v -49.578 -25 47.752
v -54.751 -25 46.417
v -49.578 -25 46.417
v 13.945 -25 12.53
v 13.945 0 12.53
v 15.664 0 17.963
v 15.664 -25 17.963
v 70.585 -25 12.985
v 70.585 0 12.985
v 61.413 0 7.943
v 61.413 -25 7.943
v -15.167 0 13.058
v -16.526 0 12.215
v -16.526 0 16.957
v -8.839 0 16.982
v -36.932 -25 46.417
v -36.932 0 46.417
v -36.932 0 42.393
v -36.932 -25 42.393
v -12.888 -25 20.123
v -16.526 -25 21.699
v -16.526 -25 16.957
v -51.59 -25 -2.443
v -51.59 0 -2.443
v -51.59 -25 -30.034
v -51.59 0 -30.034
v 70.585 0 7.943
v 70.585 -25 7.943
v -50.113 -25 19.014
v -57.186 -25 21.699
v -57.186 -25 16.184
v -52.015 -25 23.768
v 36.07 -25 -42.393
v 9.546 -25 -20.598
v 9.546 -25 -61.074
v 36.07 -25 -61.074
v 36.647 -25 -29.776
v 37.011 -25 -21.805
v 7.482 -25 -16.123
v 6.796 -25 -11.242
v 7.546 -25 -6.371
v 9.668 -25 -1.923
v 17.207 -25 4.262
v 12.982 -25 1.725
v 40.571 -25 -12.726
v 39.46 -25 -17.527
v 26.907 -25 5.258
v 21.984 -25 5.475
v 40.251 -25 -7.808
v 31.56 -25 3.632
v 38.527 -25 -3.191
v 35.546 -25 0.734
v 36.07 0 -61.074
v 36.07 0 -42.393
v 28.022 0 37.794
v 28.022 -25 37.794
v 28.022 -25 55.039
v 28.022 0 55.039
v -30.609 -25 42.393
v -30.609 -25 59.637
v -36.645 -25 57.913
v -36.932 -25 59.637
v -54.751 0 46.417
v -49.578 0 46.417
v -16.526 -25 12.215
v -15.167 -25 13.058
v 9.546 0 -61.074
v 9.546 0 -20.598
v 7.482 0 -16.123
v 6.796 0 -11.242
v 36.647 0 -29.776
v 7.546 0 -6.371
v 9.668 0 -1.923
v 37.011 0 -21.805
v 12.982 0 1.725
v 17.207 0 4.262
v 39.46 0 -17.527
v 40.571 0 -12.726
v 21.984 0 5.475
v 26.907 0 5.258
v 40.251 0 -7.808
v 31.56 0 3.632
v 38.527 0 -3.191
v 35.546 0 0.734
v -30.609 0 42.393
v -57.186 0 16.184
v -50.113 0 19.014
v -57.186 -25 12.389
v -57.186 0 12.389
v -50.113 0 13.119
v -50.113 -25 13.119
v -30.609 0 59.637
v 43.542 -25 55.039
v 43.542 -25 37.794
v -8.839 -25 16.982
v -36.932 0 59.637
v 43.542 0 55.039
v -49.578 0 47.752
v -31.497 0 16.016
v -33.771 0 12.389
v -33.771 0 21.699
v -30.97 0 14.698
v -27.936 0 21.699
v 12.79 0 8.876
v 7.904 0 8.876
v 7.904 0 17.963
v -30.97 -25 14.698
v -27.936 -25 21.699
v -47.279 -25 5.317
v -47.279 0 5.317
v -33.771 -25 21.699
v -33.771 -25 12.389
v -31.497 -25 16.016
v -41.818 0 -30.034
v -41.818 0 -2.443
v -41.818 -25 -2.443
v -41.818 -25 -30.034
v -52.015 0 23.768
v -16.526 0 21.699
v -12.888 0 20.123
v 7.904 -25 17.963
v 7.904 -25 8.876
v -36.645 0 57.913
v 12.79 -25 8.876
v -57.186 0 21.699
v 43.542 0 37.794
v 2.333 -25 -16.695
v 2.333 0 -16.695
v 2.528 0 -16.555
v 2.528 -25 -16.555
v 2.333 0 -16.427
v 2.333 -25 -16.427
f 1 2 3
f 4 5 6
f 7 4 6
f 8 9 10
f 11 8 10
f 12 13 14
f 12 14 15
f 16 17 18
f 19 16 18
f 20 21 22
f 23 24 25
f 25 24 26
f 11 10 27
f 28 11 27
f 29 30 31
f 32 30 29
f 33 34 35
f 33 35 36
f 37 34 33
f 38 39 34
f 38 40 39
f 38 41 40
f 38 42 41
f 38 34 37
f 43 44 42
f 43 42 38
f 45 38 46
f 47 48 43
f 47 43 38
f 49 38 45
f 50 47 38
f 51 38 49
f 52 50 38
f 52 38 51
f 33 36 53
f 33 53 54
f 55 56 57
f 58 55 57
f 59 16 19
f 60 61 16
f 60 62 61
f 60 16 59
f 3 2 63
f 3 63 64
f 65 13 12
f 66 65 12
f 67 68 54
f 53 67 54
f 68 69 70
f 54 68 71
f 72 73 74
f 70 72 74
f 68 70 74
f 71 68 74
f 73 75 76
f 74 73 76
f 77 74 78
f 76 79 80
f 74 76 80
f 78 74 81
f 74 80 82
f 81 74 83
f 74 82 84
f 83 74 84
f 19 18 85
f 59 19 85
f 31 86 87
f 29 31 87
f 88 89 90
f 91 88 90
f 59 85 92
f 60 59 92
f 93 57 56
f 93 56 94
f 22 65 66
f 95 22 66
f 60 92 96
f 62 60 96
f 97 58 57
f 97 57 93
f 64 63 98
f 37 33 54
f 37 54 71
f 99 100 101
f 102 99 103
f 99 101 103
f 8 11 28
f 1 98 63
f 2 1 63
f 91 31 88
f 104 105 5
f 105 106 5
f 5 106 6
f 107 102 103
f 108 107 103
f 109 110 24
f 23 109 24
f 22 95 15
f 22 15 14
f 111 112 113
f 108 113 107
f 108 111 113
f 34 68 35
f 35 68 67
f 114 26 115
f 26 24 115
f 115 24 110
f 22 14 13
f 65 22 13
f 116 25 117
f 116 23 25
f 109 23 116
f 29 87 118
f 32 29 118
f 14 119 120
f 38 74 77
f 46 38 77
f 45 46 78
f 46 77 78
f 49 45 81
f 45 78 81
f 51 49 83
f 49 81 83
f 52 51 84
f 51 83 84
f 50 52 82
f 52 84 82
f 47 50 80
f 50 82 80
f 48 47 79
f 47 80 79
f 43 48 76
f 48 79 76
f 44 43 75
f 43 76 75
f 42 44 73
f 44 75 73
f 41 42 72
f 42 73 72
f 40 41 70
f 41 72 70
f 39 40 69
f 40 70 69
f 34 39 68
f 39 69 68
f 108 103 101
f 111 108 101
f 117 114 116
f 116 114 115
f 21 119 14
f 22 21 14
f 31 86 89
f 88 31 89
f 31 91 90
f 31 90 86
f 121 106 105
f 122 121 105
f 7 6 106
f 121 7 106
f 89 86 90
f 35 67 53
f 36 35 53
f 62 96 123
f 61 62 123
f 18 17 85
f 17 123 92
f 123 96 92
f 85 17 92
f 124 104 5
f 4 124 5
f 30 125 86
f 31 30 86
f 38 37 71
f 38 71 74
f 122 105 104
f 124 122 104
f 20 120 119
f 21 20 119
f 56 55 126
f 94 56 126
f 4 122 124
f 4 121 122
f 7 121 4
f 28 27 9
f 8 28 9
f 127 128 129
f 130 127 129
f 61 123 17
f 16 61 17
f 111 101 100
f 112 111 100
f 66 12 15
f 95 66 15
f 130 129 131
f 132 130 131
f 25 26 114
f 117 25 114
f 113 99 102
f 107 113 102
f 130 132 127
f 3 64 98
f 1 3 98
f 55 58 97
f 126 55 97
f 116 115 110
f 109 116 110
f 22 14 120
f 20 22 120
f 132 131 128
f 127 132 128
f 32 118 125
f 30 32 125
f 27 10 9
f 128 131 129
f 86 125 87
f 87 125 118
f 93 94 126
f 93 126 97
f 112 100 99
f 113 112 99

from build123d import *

# Parameters (mm, degrees)
F1_DEPTH = 25
F2_W     = 15.520076
F2_H     = 17.244525
F3_DEPTH = 25
F4_R     = 16.91566
F5_DEPTH = 25


with BuildPart() as f1:
    # F0 (on Front) → F1 (new body)
    with BuildSketch(Plane.XZ):
        Polygon((36.646812, -29.775604), (37.223821, -17.158411), (33.666293, -19.27908), (29.848246, -20.883999), (25.843995, -21.941929), (21.731478, -22.43228), (17.590739, -22.345506), (13.502375, -21.683298), (9.545959, -20.458544), (9.545959, -31.425671), (9.545959, -42.392798), (15.102927, -42.392798), (22.807881, -42.392798), (36.069803, -42.392798), align=None)
        Polygon((-16.526002, 21.699362), (-16.526002, 16.957117), (-12.888361, 20.12305), align=None)
        Polygon((-16.526002, 12.214873), (-15.167016, 13.057691), (-8.839482, 16.981909), (-16.526002, 16.957117), align=None)
        Polygon((2.332938, -16.695337), (2.527629, -16.554642), (2.332938, -16.427238), align=None)
        Polygon((36.069803, -61.074365), (36.069803, -42.392798), (22.807881, -42.392798), (15.102927, -42.392798), (9.545959, -42.392798), (9.545959, -61.074365), (15.663777, -61.074365), (30.321628, -61.074365), align=None)
        Polygon((7.903743, 12.639839), (7.903743, 8.876176), (12.78969, 8.876176), (13.945488, 12.530412), align=None)
        Polygon((7.903743, 17.963048), (7.903743, 12.639839), (13.945488, 12.530412), (15.663777, 17.963048), align=None)
        Polygon((-51.589873, -30.034218), (-47.278743, -30.034218), (-44.548359, -30.034218), (-41.817974, -30.034218), (-41.817974, -2.442975), (-51.589873, -2.442975), align=None)
        Polygon((-47.278743, 5.317062), (-51.589873, -2.442975), (-41.817974, -2.442975), align=None)
        Polygon((-49.578011, 46.416517), (-49.578011, 47.751577), (-54.75137, 46.416517), align=None)
        Polygon((-36.644619, 57.912868), (-36.932025, 46.416517), (-36.932025, 42.392798), (-30.609036, 42.392798), (-30.609036, 59.637319), (-36.932025, 59.637319), align=None)
        Polygon((-57.186145, 21.699362), (-57.186145, 16.184396), (-50.11319, 19.013576), (-52.014902, 23.767858), align=None)
        Polygon((-57.186145, 16.184396), (-57.186145, 12.388555), (-50.11319, 13.119449), align=None)
        Polygon((-27.936135, 21.699362), (-33.770531, 21.699362), (-31.497301, 16.016283), align=None)
        Polygon((-31.497301, 16.016283), (-33.770531, 21.699362), (-33.770531, 12.388555), align=None)
        Polygon((-27.936135, 21.699362), (-31.497301, 16.016283), (-30.970022, 14.698084), align=None)
        Polygon((70.585034, 7.942672), (70.585034, 12.98516), (61.412587, 7.942672), align=None)
    extrude(amount=F1_DEPTH)

    # F4 (on Front) → F5 (join)
    with BuildSketch(Plane.XZ):
        with Locations((23.711223, -11.352646)):
            Circle(F4_R)
    extrude(amount=F5_DEPTH)


with BuildPart() as f3:
    # F2 (on Front) → F3 (new body)
    with BuildSketch(Plane.XZ):
        with Locations((35.782392, 46.416517)):
            Rectangle(F2_W, F2_H)
    extrude(amount=F3_DEPTH)


solid = Compound([f1.part, f3.part])
